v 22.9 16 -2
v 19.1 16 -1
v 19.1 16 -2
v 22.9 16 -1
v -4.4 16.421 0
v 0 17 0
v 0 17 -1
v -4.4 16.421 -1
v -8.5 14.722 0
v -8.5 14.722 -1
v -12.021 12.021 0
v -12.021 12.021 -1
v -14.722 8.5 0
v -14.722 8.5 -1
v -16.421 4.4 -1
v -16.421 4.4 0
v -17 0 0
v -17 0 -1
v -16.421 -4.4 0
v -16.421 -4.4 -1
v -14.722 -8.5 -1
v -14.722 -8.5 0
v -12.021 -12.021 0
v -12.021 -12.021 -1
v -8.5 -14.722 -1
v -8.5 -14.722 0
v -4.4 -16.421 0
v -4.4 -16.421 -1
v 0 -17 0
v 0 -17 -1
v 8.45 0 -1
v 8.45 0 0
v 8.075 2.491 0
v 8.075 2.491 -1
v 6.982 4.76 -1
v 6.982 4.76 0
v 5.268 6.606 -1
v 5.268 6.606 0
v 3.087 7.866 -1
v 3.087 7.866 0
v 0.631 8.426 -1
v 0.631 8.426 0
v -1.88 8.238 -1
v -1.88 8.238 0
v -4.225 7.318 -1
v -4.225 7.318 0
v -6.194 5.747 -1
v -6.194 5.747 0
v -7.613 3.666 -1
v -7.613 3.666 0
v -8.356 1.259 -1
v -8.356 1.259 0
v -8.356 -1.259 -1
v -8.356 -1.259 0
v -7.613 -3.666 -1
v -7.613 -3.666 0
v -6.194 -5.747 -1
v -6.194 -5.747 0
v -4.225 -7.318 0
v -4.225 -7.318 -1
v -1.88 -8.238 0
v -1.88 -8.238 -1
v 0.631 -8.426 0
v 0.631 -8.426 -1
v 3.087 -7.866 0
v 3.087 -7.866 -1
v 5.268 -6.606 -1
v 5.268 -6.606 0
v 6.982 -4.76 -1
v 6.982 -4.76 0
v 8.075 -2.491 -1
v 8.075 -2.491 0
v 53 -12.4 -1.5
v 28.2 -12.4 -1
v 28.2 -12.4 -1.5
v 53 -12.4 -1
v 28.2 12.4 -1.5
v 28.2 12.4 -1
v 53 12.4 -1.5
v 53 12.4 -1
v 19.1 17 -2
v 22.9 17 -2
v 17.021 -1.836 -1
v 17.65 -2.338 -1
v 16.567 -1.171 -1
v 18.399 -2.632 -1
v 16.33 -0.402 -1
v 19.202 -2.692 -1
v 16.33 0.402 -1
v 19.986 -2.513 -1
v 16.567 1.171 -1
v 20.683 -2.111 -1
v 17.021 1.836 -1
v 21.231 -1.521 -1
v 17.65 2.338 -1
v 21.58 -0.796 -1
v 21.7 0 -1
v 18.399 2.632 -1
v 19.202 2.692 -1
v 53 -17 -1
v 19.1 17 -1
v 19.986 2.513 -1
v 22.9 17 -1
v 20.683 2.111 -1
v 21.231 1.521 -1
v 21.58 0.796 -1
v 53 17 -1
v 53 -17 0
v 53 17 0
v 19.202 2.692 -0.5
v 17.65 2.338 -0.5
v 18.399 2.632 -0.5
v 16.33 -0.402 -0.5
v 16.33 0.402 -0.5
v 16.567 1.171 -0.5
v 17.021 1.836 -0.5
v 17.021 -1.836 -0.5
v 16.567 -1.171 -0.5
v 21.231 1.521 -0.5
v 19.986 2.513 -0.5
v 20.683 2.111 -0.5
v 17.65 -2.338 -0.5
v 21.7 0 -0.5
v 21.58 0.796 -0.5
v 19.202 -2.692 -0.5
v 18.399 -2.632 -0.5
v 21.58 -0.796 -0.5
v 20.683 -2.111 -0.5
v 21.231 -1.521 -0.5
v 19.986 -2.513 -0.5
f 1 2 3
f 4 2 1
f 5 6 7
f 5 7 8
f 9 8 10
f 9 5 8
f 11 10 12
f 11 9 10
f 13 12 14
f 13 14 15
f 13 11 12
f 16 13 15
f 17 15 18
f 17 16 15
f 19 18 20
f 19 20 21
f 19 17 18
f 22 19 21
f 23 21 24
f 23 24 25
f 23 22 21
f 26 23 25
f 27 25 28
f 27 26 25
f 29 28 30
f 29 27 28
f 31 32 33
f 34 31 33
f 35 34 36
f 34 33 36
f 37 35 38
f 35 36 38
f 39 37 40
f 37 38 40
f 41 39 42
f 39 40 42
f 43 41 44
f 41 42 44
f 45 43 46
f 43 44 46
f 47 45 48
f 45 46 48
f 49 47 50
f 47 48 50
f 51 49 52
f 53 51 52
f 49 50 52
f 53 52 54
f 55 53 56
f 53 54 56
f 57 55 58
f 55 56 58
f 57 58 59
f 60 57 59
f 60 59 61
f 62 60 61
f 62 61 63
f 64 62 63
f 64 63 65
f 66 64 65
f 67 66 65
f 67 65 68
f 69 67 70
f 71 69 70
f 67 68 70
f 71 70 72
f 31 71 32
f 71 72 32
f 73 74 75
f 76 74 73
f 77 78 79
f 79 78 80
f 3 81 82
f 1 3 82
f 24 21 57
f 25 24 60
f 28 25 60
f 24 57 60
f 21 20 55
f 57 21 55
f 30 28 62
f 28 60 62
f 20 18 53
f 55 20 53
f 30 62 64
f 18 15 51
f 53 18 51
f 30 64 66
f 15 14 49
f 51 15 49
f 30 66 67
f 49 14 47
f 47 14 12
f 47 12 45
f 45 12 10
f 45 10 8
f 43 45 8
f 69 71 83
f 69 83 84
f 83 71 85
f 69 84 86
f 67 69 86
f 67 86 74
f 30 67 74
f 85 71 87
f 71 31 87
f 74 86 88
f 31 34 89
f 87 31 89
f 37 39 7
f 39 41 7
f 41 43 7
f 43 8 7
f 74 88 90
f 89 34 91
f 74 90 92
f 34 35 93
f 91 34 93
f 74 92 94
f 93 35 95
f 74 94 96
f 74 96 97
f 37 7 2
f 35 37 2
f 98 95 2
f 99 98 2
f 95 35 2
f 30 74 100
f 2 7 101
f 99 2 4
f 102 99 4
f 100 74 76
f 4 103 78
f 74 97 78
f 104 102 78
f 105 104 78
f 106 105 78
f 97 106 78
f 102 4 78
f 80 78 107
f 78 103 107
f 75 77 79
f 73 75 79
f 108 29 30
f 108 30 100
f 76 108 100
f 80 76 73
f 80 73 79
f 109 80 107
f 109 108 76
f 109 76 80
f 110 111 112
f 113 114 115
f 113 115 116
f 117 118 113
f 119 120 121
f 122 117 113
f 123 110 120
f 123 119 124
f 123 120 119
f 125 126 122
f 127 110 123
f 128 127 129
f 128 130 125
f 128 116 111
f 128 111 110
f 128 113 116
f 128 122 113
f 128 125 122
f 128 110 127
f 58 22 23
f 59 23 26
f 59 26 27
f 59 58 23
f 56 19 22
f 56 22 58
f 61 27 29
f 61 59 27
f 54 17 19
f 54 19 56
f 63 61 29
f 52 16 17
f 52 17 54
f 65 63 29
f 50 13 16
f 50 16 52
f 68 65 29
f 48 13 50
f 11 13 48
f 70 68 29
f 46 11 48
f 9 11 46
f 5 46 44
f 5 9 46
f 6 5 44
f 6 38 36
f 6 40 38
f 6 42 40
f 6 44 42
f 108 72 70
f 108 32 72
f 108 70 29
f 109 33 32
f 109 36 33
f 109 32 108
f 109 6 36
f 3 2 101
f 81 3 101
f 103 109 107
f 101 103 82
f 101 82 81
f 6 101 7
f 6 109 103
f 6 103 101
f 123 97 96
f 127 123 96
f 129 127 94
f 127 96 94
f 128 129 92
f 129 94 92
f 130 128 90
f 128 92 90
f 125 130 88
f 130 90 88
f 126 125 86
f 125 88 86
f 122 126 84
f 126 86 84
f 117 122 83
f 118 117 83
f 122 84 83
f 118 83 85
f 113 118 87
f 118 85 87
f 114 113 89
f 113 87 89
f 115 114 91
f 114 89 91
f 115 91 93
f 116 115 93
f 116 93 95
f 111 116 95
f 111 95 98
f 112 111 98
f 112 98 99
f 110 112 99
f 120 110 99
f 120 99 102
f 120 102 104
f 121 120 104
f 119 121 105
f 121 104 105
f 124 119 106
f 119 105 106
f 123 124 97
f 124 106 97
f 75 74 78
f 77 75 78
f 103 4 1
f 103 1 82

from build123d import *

# Parameters (mm, degrees)
F0_W     = 3.8
F0_H     = 1
F1_DEPTH = 2
F0_R     = 8.45
F0_W_2   = 24.8
F0_H_2   = 24.8
F2_DEPTH = 1
F3_R     = 2.7
F4_DEPTH = 0.5
F5_DEPTH = 1.5


with BuildPart() as f1:
    # F0 (on Top) → F1 (new body)
    with BuildSketch(Plane.XY):
        with Locations((21, 16.5)):
            Rectangle(F0_W, F0_H)
    extrude(amount=-F1_DEPTH)

    # F0 (on Top) → F2 (join)
    with BuildSketch(Plane.XY):
        with BuildLine():
            Line((19.1, 17), (0, 17))
            ThreePointArc((0, 17), (-17, 0), (0, -17))
            Line((0, -17), (53, -17))
            Line((53, -17), (53, -12.4))
            Line((53, -12.4), (28.2, -12.4))
            Line((28.2, -12.4), (28.2, 12.4))
            Line((28.2, 12.4), (53, 12.4))
            Line((53, 12.4), (53, 17))
            Line((53, 17), (22.9, 17))
            Line((22.9, 17), (22.9, 16))
            Line((22.9, 16), (19.1, 16))
            Line((19.1, 16), (19.1, 17))
        make_face()
        Circle(F0_R, mode=Mode.SUBTRACT)
        with Locations((21, 16.5)):
            Rectangle(F0_W, F0_H)
        with Locations((40.6, 0)):
            Rectangle(F0_W_2, F0_H_2)
    extrude(amount=-F2_DEPTH)

    # F3 (on face) → F4 (cut)
    with BuildSketch(Plane(origin=(0, 0, -1), x_dir=(1, 0, 0), z_dir=(0, 0, -1))):
        with Locations((19, 0)):
            Circle(F3_R)
    extrude(amount=-F4_DEPTH, mode=Mode.SUBTRACT)

    # F0 (on Top) → F5 (join)
    with BuildSketch(Plane.XY):
        with Locations((40.6, 0)):
            Rectangle(F0_W_2, F0_H_2)
    extrude(amount=-F5_DEPTH)


solid = f1.part
